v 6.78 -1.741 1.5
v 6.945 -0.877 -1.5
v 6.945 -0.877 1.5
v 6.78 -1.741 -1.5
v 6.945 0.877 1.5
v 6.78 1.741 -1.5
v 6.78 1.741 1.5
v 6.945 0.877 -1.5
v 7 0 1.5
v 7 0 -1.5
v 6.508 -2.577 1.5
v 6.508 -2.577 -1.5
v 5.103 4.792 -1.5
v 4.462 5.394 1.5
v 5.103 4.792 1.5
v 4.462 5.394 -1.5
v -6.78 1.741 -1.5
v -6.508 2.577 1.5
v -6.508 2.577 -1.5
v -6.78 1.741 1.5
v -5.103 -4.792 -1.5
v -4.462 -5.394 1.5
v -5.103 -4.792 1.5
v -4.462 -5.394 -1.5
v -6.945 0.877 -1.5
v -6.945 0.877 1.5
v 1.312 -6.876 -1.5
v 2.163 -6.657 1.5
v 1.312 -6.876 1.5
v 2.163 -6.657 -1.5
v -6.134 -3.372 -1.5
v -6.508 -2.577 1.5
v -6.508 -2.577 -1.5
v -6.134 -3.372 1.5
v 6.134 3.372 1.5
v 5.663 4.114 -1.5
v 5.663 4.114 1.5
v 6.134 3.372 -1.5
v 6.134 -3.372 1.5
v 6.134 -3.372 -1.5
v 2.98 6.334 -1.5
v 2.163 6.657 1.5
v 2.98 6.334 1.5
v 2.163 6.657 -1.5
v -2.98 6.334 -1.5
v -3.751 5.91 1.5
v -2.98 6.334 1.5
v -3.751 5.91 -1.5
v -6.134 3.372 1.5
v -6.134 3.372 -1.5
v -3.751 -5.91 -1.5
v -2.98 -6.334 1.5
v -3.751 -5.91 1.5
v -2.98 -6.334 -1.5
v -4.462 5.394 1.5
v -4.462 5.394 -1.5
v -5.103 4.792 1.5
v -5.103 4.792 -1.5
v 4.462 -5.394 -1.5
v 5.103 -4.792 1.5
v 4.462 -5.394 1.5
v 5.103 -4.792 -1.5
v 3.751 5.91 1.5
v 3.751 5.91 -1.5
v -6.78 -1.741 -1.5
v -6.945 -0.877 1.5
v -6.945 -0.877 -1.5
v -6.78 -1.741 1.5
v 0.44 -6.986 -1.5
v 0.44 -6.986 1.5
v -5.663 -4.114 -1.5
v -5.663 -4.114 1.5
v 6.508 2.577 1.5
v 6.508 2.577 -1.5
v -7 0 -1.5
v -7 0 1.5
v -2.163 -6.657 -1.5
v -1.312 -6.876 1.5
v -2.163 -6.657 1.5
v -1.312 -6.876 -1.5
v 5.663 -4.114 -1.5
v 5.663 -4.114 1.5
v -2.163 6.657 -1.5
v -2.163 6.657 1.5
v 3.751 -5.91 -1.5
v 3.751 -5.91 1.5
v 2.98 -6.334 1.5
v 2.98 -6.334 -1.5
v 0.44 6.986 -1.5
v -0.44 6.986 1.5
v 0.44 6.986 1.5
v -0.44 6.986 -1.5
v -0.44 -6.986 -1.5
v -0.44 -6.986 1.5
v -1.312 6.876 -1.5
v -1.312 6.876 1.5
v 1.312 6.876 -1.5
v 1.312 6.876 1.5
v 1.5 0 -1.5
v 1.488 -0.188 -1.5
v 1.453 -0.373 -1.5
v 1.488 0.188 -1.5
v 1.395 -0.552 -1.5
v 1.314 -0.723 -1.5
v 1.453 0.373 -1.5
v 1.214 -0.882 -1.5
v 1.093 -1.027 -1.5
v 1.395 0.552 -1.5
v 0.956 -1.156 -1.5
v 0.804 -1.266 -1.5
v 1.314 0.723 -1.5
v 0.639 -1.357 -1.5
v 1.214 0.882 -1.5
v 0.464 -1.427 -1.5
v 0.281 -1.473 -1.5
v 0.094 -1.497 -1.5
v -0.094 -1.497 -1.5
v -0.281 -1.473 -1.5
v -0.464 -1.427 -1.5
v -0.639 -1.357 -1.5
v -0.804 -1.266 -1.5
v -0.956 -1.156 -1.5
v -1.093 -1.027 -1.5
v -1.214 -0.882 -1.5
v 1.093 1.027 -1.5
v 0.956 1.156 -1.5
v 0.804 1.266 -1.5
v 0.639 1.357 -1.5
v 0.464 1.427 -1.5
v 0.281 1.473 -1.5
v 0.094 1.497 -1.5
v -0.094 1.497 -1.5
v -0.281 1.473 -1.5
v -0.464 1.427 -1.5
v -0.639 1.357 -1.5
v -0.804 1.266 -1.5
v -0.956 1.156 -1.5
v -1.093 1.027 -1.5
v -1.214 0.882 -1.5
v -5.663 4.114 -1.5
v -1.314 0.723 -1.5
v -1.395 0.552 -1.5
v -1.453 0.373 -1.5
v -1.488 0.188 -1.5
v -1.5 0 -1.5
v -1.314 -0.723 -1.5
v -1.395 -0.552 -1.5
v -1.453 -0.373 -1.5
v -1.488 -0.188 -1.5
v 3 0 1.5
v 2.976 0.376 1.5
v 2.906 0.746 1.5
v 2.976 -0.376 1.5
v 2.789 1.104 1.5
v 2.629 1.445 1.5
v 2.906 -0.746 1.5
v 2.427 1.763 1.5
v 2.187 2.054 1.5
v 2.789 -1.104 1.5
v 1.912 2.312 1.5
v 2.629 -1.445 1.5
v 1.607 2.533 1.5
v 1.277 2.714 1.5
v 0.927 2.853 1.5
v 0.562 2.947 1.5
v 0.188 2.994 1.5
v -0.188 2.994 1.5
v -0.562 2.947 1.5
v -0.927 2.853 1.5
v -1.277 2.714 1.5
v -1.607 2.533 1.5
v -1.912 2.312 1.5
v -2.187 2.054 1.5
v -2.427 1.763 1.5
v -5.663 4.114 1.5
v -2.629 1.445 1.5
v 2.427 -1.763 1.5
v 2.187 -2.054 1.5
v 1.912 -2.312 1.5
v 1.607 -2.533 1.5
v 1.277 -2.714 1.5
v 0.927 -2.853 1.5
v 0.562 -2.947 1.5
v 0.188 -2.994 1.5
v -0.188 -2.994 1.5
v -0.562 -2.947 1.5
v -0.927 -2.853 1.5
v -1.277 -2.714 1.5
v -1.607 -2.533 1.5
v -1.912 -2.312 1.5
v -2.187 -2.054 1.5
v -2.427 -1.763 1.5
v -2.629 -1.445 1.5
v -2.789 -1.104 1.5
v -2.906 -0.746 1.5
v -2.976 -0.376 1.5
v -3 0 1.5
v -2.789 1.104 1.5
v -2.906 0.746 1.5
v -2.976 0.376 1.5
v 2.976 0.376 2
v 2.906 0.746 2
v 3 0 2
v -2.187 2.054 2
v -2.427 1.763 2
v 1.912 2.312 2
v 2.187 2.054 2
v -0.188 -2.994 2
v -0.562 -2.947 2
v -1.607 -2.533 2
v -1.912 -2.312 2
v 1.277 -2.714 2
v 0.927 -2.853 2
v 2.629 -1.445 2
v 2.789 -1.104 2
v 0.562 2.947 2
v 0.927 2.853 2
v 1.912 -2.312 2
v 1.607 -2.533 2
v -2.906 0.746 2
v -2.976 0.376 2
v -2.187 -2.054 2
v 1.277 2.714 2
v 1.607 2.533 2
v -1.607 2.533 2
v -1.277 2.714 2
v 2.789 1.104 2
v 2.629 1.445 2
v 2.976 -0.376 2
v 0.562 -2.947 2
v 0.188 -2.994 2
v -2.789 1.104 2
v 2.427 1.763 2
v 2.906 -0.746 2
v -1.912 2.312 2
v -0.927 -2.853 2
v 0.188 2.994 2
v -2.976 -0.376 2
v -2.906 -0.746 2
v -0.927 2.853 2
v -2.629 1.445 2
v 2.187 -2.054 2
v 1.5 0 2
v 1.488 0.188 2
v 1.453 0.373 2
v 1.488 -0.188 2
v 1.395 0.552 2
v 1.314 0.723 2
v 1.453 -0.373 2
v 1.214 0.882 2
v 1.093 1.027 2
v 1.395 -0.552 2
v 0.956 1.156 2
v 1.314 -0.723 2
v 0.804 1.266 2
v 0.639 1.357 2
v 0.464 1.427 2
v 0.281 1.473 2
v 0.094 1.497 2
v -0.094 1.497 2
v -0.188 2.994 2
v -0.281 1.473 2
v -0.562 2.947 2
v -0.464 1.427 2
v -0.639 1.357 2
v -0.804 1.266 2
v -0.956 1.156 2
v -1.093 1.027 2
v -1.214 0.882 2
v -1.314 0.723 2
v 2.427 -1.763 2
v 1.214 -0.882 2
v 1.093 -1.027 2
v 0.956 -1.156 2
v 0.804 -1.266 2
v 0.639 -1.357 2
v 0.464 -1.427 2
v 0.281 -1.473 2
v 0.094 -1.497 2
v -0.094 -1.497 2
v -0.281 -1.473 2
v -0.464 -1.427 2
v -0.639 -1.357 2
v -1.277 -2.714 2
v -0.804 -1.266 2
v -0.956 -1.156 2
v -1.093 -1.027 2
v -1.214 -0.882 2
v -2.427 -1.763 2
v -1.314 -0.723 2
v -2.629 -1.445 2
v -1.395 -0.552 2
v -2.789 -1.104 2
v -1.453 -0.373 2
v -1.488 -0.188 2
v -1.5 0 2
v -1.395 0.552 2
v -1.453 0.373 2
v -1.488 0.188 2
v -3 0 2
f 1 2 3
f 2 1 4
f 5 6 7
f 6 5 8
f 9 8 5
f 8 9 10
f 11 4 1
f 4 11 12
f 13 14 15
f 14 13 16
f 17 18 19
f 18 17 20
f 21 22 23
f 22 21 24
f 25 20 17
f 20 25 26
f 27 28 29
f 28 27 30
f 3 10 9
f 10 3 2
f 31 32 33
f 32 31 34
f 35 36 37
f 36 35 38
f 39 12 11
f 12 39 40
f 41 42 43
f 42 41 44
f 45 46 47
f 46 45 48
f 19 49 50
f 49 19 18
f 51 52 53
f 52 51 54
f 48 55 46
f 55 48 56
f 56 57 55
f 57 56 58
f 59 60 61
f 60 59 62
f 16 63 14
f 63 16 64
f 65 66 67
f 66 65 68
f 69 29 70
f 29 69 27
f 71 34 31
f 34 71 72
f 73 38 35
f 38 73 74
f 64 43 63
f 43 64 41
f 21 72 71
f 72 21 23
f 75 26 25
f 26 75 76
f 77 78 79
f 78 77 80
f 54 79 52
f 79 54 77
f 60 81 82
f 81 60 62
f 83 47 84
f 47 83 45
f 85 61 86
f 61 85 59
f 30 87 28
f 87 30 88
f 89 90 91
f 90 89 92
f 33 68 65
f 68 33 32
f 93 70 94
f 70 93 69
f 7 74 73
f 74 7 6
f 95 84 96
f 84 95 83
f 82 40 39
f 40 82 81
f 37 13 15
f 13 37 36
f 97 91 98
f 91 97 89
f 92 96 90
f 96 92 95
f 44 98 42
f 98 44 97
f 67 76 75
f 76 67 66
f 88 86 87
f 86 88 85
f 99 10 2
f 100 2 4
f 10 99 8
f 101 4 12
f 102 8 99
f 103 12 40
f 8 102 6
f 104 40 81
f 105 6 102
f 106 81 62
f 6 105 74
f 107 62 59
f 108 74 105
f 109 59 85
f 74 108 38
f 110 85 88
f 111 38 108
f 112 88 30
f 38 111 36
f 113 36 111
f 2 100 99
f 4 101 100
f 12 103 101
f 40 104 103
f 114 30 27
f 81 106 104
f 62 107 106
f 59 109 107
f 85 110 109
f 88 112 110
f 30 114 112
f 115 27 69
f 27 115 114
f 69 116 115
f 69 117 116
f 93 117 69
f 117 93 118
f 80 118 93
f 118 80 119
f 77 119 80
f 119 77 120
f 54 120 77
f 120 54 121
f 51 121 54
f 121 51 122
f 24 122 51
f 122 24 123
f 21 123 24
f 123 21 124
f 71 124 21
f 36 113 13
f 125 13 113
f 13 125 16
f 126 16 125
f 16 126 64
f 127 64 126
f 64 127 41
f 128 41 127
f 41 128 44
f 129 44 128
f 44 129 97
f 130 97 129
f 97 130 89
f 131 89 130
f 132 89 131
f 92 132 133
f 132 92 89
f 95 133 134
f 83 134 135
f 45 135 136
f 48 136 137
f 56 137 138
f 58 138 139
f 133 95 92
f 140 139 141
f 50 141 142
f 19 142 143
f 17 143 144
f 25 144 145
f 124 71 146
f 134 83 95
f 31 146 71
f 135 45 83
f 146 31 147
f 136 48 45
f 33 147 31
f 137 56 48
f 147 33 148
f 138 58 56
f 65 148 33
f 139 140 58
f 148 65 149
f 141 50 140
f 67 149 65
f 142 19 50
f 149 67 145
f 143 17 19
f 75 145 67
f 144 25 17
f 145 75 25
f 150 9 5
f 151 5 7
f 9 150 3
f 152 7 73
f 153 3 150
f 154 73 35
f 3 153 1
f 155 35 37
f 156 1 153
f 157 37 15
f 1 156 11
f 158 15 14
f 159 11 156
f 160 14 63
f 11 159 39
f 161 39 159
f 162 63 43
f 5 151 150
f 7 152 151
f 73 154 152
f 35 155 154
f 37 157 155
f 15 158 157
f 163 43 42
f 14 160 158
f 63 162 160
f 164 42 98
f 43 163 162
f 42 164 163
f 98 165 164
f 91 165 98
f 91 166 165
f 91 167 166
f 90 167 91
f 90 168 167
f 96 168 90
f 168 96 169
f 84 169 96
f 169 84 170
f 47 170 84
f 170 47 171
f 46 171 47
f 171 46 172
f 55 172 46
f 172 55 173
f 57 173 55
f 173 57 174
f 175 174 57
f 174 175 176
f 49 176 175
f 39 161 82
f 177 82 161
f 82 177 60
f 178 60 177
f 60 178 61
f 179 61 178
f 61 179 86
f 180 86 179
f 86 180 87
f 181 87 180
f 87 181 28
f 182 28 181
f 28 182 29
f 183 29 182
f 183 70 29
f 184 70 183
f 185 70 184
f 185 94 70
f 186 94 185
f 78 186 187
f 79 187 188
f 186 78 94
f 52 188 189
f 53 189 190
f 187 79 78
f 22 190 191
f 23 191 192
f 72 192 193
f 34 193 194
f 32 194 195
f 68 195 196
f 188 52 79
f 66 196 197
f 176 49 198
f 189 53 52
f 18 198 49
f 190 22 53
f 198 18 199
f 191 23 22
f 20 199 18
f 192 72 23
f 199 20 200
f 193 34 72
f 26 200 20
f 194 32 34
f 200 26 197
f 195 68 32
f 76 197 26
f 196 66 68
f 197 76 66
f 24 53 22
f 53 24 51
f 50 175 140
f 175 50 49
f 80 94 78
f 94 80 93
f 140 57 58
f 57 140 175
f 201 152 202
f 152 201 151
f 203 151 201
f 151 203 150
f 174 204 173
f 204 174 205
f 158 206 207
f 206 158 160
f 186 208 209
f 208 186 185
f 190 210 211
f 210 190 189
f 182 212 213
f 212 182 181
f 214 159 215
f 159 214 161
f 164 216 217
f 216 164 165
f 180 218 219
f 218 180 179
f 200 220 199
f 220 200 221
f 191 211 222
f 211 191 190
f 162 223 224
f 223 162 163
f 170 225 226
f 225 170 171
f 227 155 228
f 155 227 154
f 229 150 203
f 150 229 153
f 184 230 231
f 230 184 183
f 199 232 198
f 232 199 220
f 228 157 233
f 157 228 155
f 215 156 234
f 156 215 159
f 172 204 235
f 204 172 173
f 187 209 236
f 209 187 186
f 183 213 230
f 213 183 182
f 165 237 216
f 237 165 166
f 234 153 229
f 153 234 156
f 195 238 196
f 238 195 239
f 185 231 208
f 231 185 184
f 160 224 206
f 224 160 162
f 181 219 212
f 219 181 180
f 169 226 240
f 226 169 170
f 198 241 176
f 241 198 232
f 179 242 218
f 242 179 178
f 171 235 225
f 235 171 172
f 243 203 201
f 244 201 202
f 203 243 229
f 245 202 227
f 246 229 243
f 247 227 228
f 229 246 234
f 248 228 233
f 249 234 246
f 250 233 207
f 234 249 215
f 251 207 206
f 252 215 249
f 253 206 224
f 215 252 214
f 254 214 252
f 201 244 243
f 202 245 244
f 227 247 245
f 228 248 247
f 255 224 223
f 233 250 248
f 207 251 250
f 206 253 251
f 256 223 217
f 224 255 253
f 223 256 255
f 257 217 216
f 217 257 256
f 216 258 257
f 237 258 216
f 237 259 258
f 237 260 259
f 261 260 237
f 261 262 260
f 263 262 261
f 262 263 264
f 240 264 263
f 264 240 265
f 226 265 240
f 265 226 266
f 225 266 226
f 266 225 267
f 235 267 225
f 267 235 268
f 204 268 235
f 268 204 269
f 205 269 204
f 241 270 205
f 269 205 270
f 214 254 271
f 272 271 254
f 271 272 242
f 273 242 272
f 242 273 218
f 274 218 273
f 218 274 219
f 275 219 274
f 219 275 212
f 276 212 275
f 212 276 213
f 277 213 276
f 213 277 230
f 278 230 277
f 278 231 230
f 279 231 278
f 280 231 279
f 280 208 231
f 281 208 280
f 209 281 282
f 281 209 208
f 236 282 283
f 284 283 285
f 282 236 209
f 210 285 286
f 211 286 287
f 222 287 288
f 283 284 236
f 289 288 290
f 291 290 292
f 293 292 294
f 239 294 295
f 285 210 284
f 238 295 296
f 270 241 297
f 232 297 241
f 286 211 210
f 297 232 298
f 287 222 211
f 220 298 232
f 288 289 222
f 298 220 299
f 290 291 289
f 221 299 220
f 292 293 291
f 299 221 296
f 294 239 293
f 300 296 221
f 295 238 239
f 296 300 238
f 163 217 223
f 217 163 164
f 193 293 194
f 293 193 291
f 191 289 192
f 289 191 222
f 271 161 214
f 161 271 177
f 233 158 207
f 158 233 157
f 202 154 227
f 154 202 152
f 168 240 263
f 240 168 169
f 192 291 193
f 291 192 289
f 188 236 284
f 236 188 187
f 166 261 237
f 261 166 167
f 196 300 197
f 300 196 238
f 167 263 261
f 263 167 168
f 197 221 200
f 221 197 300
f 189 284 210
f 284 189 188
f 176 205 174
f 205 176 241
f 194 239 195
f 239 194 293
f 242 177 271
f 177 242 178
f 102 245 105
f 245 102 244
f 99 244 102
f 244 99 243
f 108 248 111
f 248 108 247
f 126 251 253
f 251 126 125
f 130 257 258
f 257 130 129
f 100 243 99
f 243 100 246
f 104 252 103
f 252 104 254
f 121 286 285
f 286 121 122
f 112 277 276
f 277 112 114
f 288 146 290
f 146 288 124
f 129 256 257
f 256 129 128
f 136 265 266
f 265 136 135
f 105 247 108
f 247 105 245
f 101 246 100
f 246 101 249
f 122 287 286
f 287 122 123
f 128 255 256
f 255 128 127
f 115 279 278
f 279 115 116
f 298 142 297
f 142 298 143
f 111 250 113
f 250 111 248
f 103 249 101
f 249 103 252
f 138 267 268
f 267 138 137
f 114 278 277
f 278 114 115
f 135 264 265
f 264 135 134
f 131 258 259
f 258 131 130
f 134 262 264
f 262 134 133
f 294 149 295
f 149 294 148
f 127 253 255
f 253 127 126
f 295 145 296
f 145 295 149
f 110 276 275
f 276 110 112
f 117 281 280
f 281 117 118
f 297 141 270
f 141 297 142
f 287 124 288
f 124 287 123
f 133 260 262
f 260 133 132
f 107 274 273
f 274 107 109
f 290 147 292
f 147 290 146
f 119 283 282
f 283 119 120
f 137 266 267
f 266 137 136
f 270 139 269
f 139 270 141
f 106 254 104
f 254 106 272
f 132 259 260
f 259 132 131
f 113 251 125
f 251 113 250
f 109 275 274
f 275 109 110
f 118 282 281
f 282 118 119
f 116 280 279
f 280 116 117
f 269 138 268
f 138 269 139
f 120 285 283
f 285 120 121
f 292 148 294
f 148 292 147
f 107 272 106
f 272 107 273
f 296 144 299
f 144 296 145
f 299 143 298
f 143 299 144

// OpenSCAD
$fn = 50;


difference() {
	union() {
		translate(v = [0, 0, -1.5000000000]) {
			cylinder(h = 3, r = 7.0000000000);
		}
		translate(v = [0, 0, -1.5000000000]) {
			cylinder(h = 3.5000000000, r = 3.0000000000);
		}
	}
	union() {
		translate(v = [0, 0, -100.0000000000]) {
			cylinder(h = 200, r = 1.5000000000);
		}
	}
}
